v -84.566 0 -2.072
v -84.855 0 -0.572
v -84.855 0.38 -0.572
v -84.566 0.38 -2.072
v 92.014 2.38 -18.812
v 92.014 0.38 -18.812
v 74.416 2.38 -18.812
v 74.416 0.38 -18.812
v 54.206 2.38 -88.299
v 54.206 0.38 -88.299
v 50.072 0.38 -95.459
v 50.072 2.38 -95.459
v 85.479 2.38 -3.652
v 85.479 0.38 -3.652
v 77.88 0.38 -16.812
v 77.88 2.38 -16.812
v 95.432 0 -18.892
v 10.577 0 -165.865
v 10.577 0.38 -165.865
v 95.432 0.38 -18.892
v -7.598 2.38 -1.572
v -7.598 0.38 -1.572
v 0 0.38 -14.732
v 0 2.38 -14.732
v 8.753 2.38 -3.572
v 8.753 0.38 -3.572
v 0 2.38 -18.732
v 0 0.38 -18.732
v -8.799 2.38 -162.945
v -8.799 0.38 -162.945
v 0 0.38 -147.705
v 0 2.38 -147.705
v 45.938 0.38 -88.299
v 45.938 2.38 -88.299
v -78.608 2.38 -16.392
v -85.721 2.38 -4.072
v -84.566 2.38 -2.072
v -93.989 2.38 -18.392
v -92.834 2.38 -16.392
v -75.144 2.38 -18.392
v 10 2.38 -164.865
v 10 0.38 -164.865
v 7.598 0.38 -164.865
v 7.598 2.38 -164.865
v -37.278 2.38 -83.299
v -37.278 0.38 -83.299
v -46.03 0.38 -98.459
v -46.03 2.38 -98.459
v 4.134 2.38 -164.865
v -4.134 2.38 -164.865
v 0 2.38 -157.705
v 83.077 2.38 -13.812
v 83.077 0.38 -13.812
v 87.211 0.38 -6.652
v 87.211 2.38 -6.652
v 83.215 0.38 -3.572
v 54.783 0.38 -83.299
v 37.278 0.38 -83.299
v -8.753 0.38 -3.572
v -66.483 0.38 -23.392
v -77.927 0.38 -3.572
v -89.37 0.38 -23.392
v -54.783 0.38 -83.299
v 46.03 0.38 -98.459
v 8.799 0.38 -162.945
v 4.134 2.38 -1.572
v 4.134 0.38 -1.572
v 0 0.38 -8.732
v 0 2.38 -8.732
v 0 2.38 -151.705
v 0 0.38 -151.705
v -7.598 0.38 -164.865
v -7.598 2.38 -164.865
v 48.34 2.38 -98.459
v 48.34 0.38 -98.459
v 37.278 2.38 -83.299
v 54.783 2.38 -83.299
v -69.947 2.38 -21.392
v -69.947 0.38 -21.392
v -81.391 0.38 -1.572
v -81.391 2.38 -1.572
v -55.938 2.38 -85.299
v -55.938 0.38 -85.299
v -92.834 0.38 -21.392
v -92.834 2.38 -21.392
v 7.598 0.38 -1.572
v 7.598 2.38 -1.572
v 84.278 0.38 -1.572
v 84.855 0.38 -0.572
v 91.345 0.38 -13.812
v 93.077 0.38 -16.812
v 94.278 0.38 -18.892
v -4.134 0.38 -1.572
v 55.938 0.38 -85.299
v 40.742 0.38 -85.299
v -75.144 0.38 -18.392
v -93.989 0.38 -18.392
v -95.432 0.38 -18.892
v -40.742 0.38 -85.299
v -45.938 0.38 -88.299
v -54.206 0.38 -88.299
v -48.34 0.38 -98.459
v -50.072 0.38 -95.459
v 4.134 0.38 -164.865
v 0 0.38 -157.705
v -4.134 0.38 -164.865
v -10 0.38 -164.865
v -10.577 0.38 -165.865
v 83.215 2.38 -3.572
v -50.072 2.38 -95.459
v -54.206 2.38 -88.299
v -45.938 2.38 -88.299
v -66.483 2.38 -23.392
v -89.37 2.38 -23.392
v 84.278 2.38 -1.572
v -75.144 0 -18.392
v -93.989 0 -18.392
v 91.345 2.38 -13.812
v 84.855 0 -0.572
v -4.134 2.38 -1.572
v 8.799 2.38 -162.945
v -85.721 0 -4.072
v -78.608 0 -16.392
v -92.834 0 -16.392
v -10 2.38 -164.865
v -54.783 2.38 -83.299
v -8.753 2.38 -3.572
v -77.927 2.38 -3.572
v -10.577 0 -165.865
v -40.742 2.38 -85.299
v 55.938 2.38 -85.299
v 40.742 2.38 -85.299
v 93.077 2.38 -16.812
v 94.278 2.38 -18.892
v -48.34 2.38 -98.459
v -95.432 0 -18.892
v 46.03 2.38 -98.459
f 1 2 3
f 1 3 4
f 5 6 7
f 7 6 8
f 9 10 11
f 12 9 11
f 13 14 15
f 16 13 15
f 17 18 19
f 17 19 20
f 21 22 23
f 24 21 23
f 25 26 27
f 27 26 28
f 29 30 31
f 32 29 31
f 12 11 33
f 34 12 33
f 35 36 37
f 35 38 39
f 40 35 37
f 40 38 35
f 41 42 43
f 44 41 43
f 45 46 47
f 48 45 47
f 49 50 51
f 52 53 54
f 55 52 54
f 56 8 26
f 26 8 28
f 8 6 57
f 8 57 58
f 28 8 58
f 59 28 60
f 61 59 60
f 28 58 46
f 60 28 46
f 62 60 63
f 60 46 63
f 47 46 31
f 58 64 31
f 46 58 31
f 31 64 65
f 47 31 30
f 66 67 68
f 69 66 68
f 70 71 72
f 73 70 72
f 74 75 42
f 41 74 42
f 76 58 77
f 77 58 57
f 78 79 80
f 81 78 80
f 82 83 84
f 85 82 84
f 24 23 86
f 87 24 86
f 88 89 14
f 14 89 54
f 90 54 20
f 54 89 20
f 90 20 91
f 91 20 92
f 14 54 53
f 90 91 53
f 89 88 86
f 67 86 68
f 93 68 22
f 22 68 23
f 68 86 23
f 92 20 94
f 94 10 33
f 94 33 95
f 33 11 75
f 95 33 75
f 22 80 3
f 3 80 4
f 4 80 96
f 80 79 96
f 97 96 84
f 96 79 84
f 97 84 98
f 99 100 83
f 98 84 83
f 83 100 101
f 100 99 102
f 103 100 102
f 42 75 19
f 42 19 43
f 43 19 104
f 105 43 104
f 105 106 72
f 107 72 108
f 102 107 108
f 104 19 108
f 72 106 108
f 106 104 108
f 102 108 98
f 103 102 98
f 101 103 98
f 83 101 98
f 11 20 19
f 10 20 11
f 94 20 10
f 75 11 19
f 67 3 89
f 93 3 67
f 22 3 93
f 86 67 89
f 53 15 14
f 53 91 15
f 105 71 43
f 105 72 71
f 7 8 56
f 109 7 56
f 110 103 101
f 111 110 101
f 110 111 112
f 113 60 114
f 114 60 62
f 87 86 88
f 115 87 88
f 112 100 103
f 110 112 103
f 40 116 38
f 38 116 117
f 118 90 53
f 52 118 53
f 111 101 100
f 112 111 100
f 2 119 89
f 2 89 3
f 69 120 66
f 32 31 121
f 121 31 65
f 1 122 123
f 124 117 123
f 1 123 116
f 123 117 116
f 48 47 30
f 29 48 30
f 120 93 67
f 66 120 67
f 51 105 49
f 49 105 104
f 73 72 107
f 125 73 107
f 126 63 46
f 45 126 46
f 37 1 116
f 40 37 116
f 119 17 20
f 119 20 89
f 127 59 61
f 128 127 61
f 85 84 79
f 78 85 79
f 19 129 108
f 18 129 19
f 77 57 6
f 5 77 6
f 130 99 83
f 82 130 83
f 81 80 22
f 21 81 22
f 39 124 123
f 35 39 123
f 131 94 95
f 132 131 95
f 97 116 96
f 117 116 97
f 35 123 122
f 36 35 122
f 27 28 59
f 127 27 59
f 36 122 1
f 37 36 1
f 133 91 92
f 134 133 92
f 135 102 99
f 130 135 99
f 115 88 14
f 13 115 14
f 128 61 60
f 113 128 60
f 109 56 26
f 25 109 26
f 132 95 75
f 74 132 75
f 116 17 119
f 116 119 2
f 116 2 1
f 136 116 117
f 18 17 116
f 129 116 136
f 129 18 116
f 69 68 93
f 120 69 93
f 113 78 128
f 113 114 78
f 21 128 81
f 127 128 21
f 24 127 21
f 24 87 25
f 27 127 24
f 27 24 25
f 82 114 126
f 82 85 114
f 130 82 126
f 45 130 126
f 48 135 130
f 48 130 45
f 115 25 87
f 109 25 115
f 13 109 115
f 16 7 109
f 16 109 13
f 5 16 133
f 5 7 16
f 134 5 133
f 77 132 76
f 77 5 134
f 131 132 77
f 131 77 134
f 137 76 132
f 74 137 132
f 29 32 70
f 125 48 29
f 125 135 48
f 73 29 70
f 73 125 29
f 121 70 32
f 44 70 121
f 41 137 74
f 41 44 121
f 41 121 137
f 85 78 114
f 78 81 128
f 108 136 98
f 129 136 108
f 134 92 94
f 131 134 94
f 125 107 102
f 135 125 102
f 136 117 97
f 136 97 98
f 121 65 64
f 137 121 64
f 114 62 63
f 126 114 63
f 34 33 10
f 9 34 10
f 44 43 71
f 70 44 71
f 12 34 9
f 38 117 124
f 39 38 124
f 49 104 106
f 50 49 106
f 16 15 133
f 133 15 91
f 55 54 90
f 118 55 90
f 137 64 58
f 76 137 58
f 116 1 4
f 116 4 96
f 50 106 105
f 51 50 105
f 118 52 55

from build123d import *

# Parameters (mm, degrees)
BOSS_EXTRUDE1_DEPTH   = 2.38
BOSS_EXTRUDE1_2_DEPTH = 2.38
BOSS_EXTRUDE1_3_DEPTH = 2.38
BOSS_EXTRUDE1_4_DEPTH = 2.38
BOSS_EXTRUDE1_5_DEPTH = 2.38
BOSS_EXTRUDE1_6_DEPTH = 2.38
BOSS_EXTRUDE1_7_DEPTH = 2.38
BOSS_EXTRUDE4_DEPTH   = 0.38


with BuildPart() as part:
    # Sketch1 → Boss-Extrude1 (new body)
    with BuildSketch(Plane(origin=(0, 0, 0), x_dir=(1, 0, 0), z_dir=(0, 1, 0))):
        Polygon((-85.720943795, 4.071796796), (-84.566243256, 2.071796795), (-75.143593538, 18.392304849), (-93.988892974, 18.392304849), (-92.834192436, 16.392304849), (-78.607695153, 16.392304849), align=None)
    extrude(amount=BOSS_EXTRUDE1_DEPTH)


with BuildPart() as body_2:
    # Sketch1 → Boss-Extrude1 2 (new body)
    with BuildSketch(Plane(origin=(0, 0, 0), x_dir=(1, 0, 0), z_dir=(0, 1, 0))):
        Polygon((-1.08e-07, 8.732050756), (-4.133974466, 1.571796687), (4.133974507, 1.571796687), align=None)
    extrude(amount=BOSS_EXTRUDE1_2_DEPTH)


with BuildPart() as body_3:
    # Sketch1 → Boss-Extrude1 3 (new body)
    with BuildSketch(Plane(origin=(0, 0, 0), x_dir=(1, 0, 0), z_dir=(0, 1, 0))):
        Polygon((91.344555444, 13.812177834), (83.076606252, 13.812177834), (87.210580853, 6.651923788), align=None)
    extrude(amount=BOSS_EXTRUDE1_3_DEPTH)


with BuildPart() as body_4:
    # Sketch1 → Boss-Extrude1 4 (new body)
    with BuildSketch(Plane(origin=(0, 0, 0), x_dir=(1, 0, 0), z_dir=(0, 1, 0))):
        Polygon((50.07179685, 95.458946841), (45.937822254, 88.298692803), (54.205771446, 88.298692803), align=None)
    extrude(amount=BOSS_EXTRUDE1_4_DEPTH)


with BuildPart() as body_5:
    # Sketch1 → Boss-Extrude1 5 (new body)
    with BuildSketch(Plane(origin=(0, 0, 0), x_dir=(1, 0, 0), z_dir=(0, 1, 0))):
        Polygon((4.133974596, 164.865334799), (-4.133974596, 164.865334799), (0, 157.705080761), align=None)
    extrude(amount=BOSS_EXTRUDE1_5_DEPTH)


with BuildPart() as body_6:
    # Sketch1 → Boss-Extrude1 6 (new body)
    with BuildSketch(Plane(origin=(0, 0, 0), x_dir=(1, 0, 0), z_dir=(0, 1, 0))):
        Polygon((-50.071796745, 95.458946839), (-54.205771341, 88.298692801), (-45.937822149, 88.298692801), align=None)
    extrude(amount=BOSS_EXTRUDE1_6_DEPTH)


with BuildPart() as body_7:
    # Sketch1 → Boss-Extrude1 7 (new body)
    with BuildSketch(Plane(origin=(0, 0, 0), x_dir=(1, 0, 0), z_dir=(0, 1, 0))):
        Polygon((-92.834192436, 21.392304849), (-69.947441134, 21.392304849), (-81.390816785, 1.571796811), (-7.598076227, 1.571796811), (5.6e-08, 14.732050972), (7.598076338, 1.571796812), (84.27756817, 1.571796812), (85.478530104, 3.651923899), (77.880453952, 16.812177834), (93.076606256, 16.812177834), (94.277568143, 18.892304841), (55.937822181, 85.298692796), (40.741669759, 85.298692796), (48.33974597, 98.458946834), (10.000000007, 164.865334792), (7.598076211, 164.865334792), (0, 151.705080754), (-7.598076212, 164.865334792), (-9.999999977, 164.865334792), (-48.339745938, 98.458946839), (-40.741669726, 85.298692801), (-55.937822149, 85.298692801), align=None)
        Polygon((-8.752776823, 3.571796679), (-77.926715228, 3.571796679), (-66.4833395, 23.392304849), (-89.370090821, 23.392304849), (-54.783121611, 83.298692801), (-37.277568111, 83.298692801), (-46.030344861, 98.458946839), (-8.799038094, 162.945461791), (0, 147.705080754), (8.799038109, 162.945461817), (46.030344894, 98.458946834), (37.277568144, 83.298692796), (54.783121643, 83.298692796), (92.014428415, 18.812177834), (74.416352337, 18.812177834), (83.2153905, 3.571796679), (8.752776819, 3.571796679), (-2e-09, 18.73205084), align=None, mode=Mode.SUBTRACT)
    extrude(amount=BOSS_EXTRUDE1_7_DEPTH)


    add(body_6.part)  # Boss-Extrude4 merges body 6

    add(body_2.part)  # Boss-Extrude4 merges body 2

    add(body_3.part)  # Boss-Extrude4 merges body 3

    add(body_4.part)  # Boss-Extrude4 merges body 4

    add(body_5.part)  # Boss-Extrude4 merges body 5
    # Sketch1<8> → Boss-Extrude4 (add)
    # profile 1 of 2: a face of its own
    with BuildSketch(Plane(origin=(0, 0, 0), x_dir=(1, 0, 0), z_dir=(0, 1, 0))):
        Polygon((-75.143593538, 18.392304849), (-84.566243256, 2.071796795), (-84.854918391, 0.571796796), (84.85491843, 0.571796796), (95.432268703, 18.892304753), (10.577350242, 165.865334799), (-10.577350242, 165.865334799), (-95.432268647, 18.892304849), (-93.988892974, 18.392304849), align=None)
        Polygon((4.133974507, 1.571796687), (-4.133974466, 1.571796687), (-1.08e-07, 8.732050756), align=None, mode=Mode.SUBTRACT)
        Polygon((87.210580853, 6.651923788), (83.076606252, 13.812177834), (91.344555444, 13.812177834), align=None, mode=Mode.SUBTRACT)
        Polygon((-45.937822149, 88.298692801), (-54.205771341, 88.298692801), (-50.071796745, 95.458946839), align=None, mode=Mode.SUBTRACT)
        Polygon((0, 157.705080761), (-4.133974596, 164.865334799), (4.133974596, 164.865334799), align=None, mode=Mode.SUBTRACT)
        Polygon((-81.390816785, 1.571796811), (-69.947441134, 21.392304849), (-92.834192436, 21.392304849), (-55.937822149, 85.298692801), (-40.741669726, 85.298692801), (-48.339745938, 98.458946839), (-9.999999977, 164.865334792), (-7.598076212, 164.865334792), (0, 151.705080754), (7.598076211, 164.865334792), (10.000000007, 164.865334792), (48.33974597, 98.458946834), (40.741669759, 85.298692796), (55.937822181, 85.298692796), (94.277568143, 18.892304841), (93.076606256, 16.812177834), (77.880453952, 16.812177834), (85.478530104, 3.651923899), (84.27756817, 1.571796812), (7.598076338, 1.571796812), (5.6e-08, 14.732050972), (-7.598076227, 1.571796811), align=None, mode=Mode.SUBTRACT)
        Polygon((54.205771446, 88.298692803), (45.937822254, 88.298692803), (50.07179685, 95.458946841), align=None, mode=Mode.SUBTRACT)
    # profile 2 of 2: a face of its own
    with BuildSketch(Plane(origin=(0, 0, 0), x_dir=(1, 0, 0), z_dir=(0, 1, 0))):
        Polygon((-66.4833395, 23.392304849), (-77.926715228, 3.571796679), (-8.752776823, 3.571796679), (-2e-09, 18.73205084), (8.752776819, 3.571796679), (83.2153905, 3.571796679), (74.416352337, 18.812177834), (92.014428415, 18.812177834), (54.783121643, 83.298692796), (37.277568144, 83.298692796), (46.030344894, 98.458946834), (8.799038109, 162.945461817), (0, 147.705080754), (-8.799038094, 162.945461791), (-46.030344861, 98.458946839), (-37.277568111, 83.298692801), (-54.783121611, 83.298692801), (-89.370090821, 23.392304849), align=None)
    extrude(amount=BOSS_EXTRUDE4_DEPTH)


solid = Compound([part.part, body_7.part])
